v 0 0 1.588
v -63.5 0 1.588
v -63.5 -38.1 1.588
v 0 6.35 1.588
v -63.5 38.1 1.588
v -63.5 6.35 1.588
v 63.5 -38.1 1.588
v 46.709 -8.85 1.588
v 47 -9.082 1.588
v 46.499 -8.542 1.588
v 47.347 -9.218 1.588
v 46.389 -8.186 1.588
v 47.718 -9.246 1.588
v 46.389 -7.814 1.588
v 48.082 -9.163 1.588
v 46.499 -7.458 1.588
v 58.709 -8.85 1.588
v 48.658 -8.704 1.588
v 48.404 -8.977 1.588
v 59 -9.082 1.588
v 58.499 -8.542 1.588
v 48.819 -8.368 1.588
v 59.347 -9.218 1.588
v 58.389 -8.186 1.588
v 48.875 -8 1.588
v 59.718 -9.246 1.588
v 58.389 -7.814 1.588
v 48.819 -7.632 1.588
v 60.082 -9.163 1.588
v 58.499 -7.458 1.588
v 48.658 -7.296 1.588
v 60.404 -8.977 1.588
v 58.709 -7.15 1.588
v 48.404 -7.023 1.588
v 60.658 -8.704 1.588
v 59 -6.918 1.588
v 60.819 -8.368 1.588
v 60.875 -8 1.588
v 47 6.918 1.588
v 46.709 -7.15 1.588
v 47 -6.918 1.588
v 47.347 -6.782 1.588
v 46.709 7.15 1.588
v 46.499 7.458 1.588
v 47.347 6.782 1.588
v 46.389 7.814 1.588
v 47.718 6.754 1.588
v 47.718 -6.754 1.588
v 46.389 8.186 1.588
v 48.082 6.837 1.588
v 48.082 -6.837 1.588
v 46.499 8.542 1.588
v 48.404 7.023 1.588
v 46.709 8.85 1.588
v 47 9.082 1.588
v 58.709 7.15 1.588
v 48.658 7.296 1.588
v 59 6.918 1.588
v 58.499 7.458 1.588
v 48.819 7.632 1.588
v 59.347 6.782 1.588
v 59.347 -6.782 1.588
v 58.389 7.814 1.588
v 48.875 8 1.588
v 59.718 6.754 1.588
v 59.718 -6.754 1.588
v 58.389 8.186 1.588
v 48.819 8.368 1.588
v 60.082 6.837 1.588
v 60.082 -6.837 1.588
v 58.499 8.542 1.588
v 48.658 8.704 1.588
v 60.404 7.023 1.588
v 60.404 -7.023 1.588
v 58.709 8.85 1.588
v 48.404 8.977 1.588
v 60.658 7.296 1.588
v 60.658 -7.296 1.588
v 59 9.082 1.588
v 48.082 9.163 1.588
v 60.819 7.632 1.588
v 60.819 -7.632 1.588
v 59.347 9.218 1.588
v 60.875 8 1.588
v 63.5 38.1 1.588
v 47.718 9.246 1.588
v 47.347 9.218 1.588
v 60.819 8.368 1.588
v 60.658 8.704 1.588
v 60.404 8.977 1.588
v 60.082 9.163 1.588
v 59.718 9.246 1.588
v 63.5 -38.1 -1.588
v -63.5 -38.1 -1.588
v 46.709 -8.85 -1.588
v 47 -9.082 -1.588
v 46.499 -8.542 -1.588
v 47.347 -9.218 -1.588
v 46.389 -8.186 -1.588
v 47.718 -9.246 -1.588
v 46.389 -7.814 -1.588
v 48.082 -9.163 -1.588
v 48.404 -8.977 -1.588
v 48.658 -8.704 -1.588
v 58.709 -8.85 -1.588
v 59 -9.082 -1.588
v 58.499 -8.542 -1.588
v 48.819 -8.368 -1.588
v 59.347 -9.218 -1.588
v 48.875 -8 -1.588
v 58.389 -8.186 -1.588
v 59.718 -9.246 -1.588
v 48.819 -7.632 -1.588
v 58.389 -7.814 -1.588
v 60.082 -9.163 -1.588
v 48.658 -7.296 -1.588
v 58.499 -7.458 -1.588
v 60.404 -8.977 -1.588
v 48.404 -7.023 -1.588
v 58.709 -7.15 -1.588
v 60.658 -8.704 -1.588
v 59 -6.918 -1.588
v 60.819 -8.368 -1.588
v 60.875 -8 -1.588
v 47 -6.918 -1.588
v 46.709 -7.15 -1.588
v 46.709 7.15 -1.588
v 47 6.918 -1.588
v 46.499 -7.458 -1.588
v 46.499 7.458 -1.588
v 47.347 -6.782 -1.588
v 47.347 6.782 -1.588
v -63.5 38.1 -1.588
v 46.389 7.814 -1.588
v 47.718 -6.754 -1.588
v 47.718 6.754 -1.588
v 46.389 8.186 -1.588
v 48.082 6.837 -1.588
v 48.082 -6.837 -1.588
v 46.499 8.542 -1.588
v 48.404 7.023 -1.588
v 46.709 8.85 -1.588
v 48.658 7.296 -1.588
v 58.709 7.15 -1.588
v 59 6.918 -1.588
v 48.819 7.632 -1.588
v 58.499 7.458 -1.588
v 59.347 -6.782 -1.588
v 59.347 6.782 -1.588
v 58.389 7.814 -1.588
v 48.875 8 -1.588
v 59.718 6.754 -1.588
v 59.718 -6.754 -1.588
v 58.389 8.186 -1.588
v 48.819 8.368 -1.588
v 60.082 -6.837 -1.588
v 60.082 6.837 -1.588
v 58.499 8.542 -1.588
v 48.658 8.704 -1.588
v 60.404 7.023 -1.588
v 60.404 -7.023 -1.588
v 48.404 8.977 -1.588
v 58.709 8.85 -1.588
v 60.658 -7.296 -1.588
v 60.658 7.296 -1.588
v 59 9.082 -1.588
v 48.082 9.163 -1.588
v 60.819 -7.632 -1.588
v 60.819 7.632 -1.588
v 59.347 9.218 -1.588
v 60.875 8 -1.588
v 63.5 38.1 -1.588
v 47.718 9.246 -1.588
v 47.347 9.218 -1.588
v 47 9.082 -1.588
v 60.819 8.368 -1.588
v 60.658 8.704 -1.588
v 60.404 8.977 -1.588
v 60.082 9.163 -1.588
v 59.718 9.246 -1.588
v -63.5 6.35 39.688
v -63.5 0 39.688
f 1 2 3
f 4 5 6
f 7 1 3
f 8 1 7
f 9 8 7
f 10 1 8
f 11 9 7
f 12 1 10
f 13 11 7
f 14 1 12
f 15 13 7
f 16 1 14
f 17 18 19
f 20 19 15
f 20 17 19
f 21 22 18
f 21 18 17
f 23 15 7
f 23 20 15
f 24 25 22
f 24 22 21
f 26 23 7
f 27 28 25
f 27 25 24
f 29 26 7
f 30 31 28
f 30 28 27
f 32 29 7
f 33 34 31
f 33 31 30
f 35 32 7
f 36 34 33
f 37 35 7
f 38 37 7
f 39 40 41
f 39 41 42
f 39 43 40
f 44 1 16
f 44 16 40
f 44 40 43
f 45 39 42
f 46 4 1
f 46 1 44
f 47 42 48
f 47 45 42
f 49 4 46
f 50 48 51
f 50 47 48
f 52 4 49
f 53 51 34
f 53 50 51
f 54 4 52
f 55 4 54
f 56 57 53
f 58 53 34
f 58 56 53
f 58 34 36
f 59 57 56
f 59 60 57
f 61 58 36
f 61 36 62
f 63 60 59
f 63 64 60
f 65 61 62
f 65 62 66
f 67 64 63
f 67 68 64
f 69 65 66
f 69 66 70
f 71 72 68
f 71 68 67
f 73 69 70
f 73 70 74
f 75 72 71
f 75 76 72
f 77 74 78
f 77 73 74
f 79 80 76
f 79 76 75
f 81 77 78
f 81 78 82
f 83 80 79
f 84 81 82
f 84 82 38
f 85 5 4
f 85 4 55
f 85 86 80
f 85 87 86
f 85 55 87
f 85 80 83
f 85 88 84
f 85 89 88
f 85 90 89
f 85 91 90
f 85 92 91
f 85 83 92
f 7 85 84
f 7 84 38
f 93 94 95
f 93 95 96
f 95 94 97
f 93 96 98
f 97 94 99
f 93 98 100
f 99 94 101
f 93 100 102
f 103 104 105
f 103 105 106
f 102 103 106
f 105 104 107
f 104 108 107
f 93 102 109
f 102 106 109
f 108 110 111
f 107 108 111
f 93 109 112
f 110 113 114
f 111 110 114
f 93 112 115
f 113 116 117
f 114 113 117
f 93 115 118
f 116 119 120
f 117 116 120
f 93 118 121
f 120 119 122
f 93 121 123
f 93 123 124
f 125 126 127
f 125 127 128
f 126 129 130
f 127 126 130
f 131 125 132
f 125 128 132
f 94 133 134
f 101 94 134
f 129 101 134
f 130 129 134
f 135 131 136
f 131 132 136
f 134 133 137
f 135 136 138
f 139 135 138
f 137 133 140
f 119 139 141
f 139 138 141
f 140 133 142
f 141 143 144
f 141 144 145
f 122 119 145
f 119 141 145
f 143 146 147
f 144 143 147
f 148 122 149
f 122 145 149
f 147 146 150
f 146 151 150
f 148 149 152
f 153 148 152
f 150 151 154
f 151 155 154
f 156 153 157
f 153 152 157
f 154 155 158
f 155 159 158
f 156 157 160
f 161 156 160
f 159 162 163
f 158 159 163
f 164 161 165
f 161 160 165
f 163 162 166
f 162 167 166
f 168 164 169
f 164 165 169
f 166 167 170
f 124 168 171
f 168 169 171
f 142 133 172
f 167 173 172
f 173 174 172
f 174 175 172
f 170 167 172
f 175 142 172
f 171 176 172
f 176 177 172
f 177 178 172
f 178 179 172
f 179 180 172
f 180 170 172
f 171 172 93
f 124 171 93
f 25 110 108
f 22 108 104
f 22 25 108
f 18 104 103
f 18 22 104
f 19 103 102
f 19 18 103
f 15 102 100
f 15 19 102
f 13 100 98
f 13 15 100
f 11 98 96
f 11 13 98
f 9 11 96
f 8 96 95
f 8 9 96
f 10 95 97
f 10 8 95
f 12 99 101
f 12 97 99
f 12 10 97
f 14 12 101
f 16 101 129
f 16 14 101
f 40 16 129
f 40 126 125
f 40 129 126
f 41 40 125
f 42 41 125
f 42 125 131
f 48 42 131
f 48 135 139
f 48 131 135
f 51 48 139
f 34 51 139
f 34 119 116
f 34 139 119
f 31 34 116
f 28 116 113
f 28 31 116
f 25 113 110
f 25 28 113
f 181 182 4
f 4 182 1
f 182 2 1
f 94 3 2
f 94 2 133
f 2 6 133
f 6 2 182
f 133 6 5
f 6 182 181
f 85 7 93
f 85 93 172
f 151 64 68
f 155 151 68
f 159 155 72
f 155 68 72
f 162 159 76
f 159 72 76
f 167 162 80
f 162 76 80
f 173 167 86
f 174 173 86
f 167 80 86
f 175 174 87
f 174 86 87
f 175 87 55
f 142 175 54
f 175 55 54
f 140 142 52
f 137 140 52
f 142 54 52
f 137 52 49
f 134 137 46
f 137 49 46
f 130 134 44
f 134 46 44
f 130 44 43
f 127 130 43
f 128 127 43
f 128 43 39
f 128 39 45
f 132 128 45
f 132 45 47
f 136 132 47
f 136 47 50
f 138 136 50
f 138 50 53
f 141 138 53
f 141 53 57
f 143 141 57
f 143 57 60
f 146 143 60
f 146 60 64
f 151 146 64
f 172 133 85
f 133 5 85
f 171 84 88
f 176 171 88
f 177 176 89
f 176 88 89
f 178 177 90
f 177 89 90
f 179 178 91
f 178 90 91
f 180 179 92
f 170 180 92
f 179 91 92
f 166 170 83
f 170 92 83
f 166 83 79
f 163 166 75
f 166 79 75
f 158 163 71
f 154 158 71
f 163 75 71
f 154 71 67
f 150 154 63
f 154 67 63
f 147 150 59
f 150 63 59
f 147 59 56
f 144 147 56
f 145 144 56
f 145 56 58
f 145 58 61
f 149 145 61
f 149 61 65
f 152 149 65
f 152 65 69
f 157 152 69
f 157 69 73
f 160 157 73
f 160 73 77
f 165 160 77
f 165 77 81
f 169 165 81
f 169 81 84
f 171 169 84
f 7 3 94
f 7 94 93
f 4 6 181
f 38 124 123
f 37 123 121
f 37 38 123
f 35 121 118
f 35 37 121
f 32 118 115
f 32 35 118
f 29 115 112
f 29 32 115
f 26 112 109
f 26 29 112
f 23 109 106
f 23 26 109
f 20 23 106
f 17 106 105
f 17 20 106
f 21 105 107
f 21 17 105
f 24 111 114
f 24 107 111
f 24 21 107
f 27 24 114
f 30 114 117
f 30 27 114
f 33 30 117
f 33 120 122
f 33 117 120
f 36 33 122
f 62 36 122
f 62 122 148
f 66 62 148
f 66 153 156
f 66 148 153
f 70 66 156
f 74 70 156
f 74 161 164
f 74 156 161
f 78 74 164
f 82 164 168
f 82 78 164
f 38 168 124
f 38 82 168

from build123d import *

# Parameters (mm, degrees)
ESQUISSE1_W             = 127
ESQUISSE1_H             = 76.2
BOSS_EXTRU_1_DEPTH      = 1.5875
ESQUISSE2_R             = 1.24968
ENL_V_MAT_EXTRU_1_DEPTH = 75.121121315
BOSS_EXTRUDE1_DEPTH     = 6.35


with BuildPart() as part:
    # Esquisse1 → Boss.-Extru.1 (new, symmetric)
    with BuildSketch(Plane.XY):
        Rectangle(ESQUISSE1_W, ESQUISSE1_H)
    extrude(amount=BOSS_EXTRU_1_DEPTH, both=True)

    # Esquisse2 → Enlèv. mat.-Extru.1 (cut, through all)
    with BuildSketch(Plane.XY.offset(1.5875)):
        with Locations((47.625, 8)):
            Circle(ESQUISSE2_R)
        with Locations((59.625, 8)):
            Circle(ESQUISSE2_R)
    enl_v_mat_extru_1 = extrude(amount=-ENL_V_MAT_EXTRU_1_DEPTH, mode=Mode.SUBTRACT)

    # Symétrie1: Enlèv. mat.-Extru.1 across plane
    add(enl_v_mat_extru_1.mirror(Plane.ZX), mode=Mode.SUBTRACT)

    # Sketch1 → Boss-Extrude1 (add)
    with BuildSketch(Plane(origin=(0, 0, 0), x_dir=(1, 0, 0), z_dir=(0, 1, 0))):
        Polygon((-63.5, -1.5875), (-63.5, -39.6875), (0, -1.5875), align=None)
    extrude(amount=BOSS_EXTRUDE1_DEPTH)


solid = part.part
